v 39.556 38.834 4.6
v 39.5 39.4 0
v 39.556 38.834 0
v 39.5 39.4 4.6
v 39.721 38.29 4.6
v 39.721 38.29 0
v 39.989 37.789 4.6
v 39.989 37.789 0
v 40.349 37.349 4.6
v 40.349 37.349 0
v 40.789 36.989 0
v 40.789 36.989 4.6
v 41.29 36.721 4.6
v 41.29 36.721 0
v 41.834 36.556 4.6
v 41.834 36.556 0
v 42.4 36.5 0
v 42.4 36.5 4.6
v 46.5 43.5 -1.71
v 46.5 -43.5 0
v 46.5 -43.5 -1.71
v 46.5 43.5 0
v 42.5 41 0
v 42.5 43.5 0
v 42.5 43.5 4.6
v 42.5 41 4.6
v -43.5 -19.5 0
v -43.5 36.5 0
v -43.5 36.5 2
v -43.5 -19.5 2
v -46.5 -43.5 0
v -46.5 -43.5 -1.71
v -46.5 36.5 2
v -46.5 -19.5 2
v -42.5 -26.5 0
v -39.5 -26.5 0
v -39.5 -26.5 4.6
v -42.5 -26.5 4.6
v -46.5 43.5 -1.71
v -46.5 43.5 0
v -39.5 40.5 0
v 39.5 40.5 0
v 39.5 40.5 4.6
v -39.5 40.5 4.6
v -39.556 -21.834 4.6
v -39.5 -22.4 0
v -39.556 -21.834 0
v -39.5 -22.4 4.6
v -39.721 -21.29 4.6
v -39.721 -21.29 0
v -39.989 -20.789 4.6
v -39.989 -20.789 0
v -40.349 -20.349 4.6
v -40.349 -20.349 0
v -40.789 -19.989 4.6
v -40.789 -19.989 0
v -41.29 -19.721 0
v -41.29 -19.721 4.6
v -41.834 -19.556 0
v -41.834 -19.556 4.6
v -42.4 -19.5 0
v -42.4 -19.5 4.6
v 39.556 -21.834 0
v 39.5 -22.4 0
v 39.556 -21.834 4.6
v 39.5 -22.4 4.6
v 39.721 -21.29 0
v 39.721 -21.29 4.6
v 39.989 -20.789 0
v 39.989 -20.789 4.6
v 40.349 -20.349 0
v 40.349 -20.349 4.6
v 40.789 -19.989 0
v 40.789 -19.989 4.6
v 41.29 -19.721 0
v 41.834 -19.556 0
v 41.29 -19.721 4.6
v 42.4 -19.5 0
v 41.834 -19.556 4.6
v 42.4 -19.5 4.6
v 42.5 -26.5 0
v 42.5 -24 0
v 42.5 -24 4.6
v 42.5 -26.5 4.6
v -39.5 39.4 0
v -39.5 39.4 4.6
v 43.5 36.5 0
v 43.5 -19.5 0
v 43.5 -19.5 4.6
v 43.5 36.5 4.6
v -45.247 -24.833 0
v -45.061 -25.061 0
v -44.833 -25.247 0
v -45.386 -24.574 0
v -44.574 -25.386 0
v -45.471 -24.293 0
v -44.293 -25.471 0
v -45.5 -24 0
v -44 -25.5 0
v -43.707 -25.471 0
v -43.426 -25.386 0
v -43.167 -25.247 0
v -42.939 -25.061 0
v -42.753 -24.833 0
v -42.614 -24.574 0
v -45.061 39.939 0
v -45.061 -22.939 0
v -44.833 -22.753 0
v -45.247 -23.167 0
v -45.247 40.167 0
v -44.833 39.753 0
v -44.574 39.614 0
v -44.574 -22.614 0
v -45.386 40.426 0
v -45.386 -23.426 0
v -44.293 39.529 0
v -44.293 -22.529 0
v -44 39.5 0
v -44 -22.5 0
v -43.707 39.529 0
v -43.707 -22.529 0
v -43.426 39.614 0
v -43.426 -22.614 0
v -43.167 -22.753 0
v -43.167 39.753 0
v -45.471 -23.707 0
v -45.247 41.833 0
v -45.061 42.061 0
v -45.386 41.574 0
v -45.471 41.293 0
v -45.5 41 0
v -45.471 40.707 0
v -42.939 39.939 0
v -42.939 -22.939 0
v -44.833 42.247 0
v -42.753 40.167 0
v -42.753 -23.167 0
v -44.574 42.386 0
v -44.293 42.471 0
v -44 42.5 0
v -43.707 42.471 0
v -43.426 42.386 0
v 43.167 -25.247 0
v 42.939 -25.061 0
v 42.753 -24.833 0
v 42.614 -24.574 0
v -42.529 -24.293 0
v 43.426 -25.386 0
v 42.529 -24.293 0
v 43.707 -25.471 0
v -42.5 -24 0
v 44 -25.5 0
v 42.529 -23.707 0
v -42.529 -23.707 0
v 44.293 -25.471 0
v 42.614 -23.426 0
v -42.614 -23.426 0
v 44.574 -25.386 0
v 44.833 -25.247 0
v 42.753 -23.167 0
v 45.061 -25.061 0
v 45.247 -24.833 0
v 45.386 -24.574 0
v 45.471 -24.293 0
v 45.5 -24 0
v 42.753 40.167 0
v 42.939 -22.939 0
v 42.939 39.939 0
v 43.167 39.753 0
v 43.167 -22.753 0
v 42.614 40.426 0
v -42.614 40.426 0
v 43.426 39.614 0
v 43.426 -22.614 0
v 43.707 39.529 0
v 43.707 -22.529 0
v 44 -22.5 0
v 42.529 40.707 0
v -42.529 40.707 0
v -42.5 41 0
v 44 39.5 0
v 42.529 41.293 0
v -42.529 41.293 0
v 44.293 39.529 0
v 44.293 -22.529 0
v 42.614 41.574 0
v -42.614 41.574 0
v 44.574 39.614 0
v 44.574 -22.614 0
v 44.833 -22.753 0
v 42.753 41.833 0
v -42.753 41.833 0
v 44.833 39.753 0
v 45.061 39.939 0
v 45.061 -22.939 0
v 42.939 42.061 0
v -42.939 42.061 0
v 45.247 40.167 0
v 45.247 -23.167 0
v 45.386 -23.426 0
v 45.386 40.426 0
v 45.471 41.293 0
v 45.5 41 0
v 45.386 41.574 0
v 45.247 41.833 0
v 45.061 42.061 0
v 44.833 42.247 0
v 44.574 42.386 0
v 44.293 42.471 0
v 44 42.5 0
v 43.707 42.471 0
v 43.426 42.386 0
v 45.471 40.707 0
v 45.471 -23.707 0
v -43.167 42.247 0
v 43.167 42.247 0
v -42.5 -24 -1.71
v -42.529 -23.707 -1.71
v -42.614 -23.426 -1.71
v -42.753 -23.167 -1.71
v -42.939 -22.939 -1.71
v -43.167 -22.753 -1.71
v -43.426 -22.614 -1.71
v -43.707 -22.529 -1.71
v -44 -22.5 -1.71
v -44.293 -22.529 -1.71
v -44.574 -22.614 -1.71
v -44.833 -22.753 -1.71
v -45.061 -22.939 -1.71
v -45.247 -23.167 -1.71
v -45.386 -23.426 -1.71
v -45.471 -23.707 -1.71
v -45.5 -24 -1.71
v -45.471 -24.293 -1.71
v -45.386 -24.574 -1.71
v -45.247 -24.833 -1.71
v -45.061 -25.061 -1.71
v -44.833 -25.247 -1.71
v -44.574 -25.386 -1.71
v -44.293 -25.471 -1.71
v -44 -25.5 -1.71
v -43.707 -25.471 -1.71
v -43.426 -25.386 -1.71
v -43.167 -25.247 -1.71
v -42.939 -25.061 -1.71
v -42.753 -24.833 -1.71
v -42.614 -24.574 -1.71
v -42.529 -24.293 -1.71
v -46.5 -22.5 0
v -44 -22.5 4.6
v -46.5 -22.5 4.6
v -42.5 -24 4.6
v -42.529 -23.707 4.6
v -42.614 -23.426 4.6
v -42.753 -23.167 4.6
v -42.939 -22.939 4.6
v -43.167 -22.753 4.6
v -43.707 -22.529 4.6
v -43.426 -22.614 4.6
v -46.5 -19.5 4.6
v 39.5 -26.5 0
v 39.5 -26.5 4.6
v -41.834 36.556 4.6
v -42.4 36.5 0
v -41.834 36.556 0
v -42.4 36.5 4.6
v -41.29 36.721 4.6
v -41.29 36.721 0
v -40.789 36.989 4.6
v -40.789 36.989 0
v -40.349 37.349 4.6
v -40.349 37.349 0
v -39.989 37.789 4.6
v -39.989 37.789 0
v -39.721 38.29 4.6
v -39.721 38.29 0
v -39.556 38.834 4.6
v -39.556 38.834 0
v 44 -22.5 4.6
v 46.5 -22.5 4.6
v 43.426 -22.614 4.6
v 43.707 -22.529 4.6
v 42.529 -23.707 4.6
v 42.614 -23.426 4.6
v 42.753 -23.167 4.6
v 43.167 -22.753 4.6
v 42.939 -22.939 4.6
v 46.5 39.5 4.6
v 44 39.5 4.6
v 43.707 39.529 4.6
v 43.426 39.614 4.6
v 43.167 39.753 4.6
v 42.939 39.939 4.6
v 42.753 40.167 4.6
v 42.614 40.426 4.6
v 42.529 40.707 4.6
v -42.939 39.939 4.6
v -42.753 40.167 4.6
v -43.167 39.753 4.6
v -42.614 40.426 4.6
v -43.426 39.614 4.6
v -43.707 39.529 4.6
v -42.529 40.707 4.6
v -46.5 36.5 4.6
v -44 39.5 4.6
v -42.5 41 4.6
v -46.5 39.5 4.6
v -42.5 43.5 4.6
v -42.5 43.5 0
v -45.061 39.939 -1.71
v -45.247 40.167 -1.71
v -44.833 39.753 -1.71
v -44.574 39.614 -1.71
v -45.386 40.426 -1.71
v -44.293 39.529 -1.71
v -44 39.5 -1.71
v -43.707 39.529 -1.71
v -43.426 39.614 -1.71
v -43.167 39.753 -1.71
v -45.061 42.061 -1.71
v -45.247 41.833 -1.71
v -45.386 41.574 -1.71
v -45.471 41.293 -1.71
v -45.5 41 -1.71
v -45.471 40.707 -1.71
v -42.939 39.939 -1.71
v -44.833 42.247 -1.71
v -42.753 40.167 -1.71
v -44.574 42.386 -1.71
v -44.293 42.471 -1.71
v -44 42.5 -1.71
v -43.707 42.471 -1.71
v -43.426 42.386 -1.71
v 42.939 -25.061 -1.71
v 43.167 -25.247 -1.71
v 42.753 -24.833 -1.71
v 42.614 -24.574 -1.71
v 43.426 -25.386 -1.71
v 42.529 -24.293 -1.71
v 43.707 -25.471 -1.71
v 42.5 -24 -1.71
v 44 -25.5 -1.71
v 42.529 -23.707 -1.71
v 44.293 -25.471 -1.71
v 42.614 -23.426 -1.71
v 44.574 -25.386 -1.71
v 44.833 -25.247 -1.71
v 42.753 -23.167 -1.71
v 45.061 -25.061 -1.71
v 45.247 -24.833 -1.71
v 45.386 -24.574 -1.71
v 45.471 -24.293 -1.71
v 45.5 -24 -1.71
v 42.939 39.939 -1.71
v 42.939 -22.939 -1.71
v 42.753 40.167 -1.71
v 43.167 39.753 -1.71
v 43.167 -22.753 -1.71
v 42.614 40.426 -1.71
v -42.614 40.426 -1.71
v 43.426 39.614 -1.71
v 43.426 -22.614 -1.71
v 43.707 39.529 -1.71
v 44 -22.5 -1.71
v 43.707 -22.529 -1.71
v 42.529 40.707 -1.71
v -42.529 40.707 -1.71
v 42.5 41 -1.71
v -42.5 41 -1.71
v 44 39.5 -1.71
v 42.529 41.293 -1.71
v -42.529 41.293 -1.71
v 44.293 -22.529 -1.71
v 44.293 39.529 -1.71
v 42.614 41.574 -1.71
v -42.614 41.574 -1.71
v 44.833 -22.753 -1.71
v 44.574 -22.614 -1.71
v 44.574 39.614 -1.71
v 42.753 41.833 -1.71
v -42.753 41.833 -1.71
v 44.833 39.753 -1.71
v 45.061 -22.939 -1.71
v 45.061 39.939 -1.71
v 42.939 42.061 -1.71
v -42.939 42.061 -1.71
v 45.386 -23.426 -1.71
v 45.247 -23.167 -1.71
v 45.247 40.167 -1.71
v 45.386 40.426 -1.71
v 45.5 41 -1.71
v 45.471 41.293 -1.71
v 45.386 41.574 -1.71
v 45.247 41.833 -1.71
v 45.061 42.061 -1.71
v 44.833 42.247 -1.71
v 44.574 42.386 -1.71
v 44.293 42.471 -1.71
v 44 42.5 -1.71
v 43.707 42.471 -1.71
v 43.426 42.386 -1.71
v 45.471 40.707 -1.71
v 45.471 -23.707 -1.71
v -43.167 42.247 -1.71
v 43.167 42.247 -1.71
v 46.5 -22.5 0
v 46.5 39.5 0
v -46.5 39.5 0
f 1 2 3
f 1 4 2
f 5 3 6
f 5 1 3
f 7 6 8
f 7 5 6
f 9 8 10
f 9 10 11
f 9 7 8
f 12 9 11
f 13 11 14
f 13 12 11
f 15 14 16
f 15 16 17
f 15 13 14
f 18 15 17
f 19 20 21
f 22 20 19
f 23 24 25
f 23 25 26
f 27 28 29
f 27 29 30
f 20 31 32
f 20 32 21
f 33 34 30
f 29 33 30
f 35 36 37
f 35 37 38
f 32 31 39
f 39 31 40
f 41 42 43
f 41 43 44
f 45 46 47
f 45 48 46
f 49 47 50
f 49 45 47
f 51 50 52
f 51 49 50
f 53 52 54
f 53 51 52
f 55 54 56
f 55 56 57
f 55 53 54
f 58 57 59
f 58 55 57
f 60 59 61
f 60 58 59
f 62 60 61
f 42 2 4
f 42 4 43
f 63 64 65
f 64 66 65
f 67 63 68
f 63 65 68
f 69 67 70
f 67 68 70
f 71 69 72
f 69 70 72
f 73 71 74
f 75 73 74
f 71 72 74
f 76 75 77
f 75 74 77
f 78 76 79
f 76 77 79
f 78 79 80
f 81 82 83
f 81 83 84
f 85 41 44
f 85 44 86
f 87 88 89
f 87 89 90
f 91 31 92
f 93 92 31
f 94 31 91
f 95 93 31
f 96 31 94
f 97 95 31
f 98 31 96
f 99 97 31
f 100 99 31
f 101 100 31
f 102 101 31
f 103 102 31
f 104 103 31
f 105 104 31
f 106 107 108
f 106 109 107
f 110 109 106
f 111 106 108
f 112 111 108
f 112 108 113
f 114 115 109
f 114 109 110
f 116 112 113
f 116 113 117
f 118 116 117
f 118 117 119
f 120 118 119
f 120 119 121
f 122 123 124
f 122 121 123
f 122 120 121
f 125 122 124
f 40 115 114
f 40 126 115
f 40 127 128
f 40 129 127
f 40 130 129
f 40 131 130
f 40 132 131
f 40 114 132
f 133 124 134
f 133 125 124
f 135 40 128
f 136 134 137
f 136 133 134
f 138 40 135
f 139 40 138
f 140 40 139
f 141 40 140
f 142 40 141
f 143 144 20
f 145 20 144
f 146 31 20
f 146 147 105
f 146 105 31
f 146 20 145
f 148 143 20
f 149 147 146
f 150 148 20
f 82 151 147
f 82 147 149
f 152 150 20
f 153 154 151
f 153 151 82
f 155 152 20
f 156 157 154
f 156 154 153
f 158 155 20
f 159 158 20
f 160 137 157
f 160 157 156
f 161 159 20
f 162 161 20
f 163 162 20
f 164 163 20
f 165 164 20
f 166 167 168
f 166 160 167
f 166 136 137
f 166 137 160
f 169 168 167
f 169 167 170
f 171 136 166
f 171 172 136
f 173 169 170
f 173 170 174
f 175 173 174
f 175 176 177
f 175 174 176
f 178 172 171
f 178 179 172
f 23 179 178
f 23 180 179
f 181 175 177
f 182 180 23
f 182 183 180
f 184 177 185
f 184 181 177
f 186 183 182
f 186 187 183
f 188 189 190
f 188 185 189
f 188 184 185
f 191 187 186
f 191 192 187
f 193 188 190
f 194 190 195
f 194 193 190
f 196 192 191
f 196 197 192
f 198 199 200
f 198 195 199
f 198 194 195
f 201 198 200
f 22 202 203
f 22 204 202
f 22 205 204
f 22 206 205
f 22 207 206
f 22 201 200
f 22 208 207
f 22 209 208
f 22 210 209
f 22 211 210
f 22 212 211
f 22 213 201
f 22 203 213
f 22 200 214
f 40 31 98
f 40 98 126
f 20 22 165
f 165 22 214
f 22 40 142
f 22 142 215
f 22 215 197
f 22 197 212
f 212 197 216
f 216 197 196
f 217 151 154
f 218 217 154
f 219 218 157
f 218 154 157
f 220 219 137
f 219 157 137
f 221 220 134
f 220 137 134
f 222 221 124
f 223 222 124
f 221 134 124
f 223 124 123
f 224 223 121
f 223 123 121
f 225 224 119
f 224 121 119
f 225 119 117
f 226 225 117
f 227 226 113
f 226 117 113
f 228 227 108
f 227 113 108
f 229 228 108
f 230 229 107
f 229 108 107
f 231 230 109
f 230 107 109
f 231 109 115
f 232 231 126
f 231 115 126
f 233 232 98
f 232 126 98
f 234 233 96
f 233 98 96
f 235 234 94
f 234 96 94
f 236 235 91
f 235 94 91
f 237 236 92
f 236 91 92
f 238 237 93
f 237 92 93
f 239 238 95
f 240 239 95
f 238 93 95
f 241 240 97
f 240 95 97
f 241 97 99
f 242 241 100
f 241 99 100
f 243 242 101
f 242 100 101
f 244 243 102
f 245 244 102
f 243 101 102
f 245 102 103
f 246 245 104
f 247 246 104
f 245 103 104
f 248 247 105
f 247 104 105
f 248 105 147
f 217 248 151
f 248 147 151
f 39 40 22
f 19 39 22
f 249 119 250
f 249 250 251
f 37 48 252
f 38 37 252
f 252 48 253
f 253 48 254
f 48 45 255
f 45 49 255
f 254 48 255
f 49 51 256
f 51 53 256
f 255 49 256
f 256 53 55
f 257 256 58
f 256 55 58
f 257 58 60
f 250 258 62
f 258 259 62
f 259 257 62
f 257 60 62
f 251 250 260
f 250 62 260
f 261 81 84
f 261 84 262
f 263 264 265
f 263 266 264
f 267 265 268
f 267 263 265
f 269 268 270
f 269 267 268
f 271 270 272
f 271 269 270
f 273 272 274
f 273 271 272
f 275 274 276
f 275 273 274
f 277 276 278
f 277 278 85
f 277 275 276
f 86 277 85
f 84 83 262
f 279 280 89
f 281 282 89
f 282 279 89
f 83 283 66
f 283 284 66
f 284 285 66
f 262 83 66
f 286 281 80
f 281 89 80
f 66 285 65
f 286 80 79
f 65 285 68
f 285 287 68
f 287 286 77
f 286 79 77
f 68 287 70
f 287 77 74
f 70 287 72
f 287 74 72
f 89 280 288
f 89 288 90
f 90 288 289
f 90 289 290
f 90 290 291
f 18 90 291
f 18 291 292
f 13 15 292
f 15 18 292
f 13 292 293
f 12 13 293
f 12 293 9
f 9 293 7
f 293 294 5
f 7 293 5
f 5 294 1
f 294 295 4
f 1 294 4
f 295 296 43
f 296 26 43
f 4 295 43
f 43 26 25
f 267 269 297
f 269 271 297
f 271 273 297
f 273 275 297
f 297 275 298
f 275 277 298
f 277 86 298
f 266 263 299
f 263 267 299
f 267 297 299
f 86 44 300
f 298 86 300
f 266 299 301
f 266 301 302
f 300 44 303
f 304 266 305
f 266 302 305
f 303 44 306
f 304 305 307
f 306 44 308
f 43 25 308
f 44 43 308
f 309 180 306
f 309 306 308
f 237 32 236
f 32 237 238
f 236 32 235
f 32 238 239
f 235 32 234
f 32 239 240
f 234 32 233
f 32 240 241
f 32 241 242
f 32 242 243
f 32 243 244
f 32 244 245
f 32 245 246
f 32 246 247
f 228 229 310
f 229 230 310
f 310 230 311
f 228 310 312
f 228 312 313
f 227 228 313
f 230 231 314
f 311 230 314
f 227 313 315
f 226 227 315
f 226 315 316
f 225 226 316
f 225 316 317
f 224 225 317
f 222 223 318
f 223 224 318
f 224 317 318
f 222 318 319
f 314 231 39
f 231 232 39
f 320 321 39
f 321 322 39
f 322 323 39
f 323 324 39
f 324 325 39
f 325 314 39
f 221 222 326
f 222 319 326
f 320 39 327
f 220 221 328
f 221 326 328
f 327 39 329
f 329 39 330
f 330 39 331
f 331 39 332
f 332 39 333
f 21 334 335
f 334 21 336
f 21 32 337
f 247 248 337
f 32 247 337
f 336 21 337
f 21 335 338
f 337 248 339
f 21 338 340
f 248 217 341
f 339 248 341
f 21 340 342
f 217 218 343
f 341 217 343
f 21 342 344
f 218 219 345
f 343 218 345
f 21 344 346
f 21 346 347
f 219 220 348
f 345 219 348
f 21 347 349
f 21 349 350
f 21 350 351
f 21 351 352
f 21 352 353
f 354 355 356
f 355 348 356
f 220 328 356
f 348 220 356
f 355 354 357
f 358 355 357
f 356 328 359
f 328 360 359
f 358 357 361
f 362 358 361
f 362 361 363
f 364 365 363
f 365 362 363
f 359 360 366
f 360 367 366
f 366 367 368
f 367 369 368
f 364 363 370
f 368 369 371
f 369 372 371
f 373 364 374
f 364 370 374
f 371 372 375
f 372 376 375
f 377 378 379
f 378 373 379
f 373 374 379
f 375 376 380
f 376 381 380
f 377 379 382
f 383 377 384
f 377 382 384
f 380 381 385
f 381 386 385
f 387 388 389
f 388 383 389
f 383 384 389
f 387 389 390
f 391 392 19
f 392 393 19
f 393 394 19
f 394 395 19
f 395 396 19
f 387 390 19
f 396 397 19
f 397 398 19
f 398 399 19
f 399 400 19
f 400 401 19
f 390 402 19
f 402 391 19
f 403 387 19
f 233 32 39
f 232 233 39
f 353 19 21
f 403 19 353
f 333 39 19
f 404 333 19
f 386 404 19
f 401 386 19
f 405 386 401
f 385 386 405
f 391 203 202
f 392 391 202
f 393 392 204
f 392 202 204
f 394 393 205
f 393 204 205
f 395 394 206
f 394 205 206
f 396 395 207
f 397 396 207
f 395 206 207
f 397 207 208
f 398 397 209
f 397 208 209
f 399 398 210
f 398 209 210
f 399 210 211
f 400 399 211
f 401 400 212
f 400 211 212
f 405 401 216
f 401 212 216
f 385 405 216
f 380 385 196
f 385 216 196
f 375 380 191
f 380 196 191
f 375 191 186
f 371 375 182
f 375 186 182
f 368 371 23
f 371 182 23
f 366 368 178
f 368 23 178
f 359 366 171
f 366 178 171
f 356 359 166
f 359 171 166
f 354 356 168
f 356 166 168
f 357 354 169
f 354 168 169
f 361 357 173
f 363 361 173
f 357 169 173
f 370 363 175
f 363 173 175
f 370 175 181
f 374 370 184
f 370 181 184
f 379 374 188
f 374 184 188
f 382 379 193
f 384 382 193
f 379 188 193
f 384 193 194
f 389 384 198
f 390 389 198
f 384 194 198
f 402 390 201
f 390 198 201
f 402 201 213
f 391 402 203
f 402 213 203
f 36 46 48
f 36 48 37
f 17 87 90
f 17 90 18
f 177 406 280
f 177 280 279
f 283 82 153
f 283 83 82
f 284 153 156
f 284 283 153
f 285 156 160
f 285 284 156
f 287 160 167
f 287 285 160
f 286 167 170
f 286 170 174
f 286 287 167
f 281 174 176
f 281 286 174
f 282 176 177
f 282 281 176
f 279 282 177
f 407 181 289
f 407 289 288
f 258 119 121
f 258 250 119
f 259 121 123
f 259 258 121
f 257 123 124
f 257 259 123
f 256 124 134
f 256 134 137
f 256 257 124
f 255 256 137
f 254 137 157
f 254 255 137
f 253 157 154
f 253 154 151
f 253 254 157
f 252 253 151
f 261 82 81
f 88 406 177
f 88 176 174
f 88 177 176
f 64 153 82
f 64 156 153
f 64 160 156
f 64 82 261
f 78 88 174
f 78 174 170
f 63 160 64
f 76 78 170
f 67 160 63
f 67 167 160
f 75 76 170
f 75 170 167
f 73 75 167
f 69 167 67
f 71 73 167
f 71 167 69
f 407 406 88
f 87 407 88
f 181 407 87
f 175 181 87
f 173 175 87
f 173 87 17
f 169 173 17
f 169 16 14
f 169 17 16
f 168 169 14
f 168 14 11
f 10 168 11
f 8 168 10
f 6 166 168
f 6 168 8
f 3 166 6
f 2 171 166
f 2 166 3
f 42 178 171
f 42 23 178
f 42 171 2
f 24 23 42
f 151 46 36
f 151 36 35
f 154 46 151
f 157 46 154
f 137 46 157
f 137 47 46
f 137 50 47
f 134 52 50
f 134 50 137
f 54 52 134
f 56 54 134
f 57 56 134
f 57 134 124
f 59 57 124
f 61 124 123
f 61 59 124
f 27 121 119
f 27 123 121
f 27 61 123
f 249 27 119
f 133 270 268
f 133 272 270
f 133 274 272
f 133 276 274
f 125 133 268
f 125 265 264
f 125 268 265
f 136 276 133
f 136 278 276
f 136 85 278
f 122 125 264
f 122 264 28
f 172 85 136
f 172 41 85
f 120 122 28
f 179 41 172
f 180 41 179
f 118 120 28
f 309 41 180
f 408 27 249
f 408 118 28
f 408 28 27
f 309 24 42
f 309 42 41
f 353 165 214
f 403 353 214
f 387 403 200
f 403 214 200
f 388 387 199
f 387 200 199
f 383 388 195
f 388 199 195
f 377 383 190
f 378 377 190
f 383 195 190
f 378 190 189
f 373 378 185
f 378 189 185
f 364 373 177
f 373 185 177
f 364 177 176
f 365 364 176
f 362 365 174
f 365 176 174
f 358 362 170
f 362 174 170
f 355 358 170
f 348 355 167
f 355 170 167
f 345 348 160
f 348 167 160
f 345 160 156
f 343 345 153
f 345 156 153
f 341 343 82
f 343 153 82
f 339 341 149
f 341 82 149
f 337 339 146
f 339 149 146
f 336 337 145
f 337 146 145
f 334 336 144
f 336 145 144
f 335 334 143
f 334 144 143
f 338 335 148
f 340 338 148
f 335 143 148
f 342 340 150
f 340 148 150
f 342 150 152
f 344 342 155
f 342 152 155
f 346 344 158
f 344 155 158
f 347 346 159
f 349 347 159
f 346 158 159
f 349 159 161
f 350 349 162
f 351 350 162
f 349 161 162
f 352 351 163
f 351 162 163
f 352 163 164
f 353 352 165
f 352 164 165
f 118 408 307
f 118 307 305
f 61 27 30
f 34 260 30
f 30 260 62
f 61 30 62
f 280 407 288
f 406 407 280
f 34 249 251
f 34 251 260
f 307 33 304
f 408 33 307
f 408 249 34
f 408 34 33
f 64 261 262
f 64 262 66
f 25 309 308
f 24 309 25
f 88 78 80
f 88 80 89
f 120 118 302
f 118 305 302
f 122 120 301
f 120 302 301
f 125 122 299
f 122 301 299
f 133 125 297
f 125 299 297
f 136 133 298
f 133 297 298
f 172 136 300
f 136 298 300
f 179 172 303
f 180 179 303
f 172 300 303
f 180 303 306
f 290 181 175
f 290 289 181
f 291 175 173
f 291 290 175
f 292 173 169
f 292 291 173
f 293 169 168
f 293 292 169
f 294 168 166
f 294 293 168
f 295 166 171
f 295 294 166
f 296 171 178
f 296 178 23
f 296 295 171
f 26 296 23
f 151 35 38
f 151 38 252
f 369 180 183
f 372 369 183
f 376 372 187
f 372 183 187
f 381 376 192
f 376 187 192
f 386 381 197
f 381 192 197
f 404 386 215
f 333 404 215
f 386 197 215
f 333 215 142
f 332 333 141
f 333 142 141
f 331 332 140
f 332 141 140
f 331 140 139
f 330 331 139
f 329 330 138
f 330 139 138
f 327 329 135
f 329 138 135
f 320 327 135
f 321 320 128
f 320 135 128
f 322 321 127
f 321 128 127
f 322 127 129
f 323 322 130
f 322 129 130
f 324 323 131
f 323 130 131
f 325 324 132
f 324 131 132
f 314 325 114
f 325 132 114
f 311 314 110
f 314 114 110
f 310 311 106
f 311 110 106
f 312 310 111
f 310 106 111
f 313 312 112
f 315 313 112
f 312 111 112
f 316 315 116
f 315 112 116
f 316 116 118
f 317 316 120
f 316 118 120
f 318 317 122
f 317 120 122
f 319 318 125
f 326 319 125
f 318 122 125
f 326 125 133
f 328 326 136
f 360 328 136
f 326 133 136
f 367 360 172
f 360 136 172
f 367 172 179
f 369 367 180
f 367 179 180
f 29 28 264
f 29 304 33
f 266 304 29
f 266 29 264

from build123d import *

# Parameters (mm, degrees)
SKETCH_W       = 93
SKETCH_H       = 87
SKETCH_R       = 1.5
PAD_DEPTH      = 1.71
PAD001_DEPTH   = 4.6
SKETCH001003_W = 3
SKETCH001003_H = 56
POCKET_DEPTH   = 2.6
FILLET_R       = 1.5
FILLET001_R    = 2.9


with BuildPart() as white_circuit_board:
    # Sketch → Pad (new body)
    with BuildSketch(Plane.XY):
        Rectangle(SKETCH_W, SKETCH_H)
        with Locations((-44, 41)):
            Circle(SKETCH_R, mode=Mode.SUBTRACT)
        with Locations((44, 41)):
            Circle(SKETCH_R, mode=Mode.SUBTRACT)
        with Locations((-44, -24)):
            Circle(SKETCH_R, mode=Mode.SUBTRACT)
        with Locations((44, -24)):
            Circle(SKETCH_R, mode=Mode.SUBTRACT)
    extrude(amount=-PAD_DEPTH)


with BuildPart() as spacer:
    # Sketch001002 → Pad001 (new body)
    with BuildSketch(Plane.XY):
        Polygon((-46.5, 39.5), (-42.5, 39.5), (-42.5, 43.5), (42.5, 43.5), (42.5, 39.5), (46.5, 39.5), (46.5, -22.5), (42.5, -22.5), (42.5, -26.5), (39.5, -26.5), (39.5, -19.5), (43.5, -19.5), (43.5, 36.5), (39.5, 36.5), (39.5, 40.5), (-39.5, 40.5), (-39.5, 36.5), (-43.5, 36.5), (-43.5, -19.5), (-39.5, -19.5), (-39.5, -26.5), (-42.5, -26.5), (-42.5, -22.5), (-46.5, -22.5), align=None)
    extrude(amount=PAD001_DEPTH)

    # Sketch001003 → Pocket (cut)
    with BuildSketch(Plane.XY.offset(4.6)):
        with Locations((-45, 8.5)):
            Rectangle(SKETCH001003_W, SKETCH001003_H)
    extrude(amount=-POCKET_DEPTH, mode=Mode.SUBTRACT)

    # Fillet
    fillet_edges = [spacer.edges().sort_by_distance(p)[0] for p in [
        (42.5, -22.5, 2.3),
        (42.5, 39.5, 2.3),
        (-42.5, 39.5, 2.3),
        (-42.5, -22.5, 2.3),
    ]]
    fillet(fillet_edges, radius=FILLET_R)

    # Fillet001
    fillet001_edges = [spacer.edges().sort_by_distance(p)[0] for p in [
        (39.5, 36.5, 2.3),
        (39.5, -19.5, 2.3),
        (-39.5, 36.5, 2.3),
        (-39.5, -19.5, 2.3),
    ]]
    fillet(fillet001_edges, radius=FILLET001_R)


solid = Compound([white_circuit_board.part, spacer.part])
